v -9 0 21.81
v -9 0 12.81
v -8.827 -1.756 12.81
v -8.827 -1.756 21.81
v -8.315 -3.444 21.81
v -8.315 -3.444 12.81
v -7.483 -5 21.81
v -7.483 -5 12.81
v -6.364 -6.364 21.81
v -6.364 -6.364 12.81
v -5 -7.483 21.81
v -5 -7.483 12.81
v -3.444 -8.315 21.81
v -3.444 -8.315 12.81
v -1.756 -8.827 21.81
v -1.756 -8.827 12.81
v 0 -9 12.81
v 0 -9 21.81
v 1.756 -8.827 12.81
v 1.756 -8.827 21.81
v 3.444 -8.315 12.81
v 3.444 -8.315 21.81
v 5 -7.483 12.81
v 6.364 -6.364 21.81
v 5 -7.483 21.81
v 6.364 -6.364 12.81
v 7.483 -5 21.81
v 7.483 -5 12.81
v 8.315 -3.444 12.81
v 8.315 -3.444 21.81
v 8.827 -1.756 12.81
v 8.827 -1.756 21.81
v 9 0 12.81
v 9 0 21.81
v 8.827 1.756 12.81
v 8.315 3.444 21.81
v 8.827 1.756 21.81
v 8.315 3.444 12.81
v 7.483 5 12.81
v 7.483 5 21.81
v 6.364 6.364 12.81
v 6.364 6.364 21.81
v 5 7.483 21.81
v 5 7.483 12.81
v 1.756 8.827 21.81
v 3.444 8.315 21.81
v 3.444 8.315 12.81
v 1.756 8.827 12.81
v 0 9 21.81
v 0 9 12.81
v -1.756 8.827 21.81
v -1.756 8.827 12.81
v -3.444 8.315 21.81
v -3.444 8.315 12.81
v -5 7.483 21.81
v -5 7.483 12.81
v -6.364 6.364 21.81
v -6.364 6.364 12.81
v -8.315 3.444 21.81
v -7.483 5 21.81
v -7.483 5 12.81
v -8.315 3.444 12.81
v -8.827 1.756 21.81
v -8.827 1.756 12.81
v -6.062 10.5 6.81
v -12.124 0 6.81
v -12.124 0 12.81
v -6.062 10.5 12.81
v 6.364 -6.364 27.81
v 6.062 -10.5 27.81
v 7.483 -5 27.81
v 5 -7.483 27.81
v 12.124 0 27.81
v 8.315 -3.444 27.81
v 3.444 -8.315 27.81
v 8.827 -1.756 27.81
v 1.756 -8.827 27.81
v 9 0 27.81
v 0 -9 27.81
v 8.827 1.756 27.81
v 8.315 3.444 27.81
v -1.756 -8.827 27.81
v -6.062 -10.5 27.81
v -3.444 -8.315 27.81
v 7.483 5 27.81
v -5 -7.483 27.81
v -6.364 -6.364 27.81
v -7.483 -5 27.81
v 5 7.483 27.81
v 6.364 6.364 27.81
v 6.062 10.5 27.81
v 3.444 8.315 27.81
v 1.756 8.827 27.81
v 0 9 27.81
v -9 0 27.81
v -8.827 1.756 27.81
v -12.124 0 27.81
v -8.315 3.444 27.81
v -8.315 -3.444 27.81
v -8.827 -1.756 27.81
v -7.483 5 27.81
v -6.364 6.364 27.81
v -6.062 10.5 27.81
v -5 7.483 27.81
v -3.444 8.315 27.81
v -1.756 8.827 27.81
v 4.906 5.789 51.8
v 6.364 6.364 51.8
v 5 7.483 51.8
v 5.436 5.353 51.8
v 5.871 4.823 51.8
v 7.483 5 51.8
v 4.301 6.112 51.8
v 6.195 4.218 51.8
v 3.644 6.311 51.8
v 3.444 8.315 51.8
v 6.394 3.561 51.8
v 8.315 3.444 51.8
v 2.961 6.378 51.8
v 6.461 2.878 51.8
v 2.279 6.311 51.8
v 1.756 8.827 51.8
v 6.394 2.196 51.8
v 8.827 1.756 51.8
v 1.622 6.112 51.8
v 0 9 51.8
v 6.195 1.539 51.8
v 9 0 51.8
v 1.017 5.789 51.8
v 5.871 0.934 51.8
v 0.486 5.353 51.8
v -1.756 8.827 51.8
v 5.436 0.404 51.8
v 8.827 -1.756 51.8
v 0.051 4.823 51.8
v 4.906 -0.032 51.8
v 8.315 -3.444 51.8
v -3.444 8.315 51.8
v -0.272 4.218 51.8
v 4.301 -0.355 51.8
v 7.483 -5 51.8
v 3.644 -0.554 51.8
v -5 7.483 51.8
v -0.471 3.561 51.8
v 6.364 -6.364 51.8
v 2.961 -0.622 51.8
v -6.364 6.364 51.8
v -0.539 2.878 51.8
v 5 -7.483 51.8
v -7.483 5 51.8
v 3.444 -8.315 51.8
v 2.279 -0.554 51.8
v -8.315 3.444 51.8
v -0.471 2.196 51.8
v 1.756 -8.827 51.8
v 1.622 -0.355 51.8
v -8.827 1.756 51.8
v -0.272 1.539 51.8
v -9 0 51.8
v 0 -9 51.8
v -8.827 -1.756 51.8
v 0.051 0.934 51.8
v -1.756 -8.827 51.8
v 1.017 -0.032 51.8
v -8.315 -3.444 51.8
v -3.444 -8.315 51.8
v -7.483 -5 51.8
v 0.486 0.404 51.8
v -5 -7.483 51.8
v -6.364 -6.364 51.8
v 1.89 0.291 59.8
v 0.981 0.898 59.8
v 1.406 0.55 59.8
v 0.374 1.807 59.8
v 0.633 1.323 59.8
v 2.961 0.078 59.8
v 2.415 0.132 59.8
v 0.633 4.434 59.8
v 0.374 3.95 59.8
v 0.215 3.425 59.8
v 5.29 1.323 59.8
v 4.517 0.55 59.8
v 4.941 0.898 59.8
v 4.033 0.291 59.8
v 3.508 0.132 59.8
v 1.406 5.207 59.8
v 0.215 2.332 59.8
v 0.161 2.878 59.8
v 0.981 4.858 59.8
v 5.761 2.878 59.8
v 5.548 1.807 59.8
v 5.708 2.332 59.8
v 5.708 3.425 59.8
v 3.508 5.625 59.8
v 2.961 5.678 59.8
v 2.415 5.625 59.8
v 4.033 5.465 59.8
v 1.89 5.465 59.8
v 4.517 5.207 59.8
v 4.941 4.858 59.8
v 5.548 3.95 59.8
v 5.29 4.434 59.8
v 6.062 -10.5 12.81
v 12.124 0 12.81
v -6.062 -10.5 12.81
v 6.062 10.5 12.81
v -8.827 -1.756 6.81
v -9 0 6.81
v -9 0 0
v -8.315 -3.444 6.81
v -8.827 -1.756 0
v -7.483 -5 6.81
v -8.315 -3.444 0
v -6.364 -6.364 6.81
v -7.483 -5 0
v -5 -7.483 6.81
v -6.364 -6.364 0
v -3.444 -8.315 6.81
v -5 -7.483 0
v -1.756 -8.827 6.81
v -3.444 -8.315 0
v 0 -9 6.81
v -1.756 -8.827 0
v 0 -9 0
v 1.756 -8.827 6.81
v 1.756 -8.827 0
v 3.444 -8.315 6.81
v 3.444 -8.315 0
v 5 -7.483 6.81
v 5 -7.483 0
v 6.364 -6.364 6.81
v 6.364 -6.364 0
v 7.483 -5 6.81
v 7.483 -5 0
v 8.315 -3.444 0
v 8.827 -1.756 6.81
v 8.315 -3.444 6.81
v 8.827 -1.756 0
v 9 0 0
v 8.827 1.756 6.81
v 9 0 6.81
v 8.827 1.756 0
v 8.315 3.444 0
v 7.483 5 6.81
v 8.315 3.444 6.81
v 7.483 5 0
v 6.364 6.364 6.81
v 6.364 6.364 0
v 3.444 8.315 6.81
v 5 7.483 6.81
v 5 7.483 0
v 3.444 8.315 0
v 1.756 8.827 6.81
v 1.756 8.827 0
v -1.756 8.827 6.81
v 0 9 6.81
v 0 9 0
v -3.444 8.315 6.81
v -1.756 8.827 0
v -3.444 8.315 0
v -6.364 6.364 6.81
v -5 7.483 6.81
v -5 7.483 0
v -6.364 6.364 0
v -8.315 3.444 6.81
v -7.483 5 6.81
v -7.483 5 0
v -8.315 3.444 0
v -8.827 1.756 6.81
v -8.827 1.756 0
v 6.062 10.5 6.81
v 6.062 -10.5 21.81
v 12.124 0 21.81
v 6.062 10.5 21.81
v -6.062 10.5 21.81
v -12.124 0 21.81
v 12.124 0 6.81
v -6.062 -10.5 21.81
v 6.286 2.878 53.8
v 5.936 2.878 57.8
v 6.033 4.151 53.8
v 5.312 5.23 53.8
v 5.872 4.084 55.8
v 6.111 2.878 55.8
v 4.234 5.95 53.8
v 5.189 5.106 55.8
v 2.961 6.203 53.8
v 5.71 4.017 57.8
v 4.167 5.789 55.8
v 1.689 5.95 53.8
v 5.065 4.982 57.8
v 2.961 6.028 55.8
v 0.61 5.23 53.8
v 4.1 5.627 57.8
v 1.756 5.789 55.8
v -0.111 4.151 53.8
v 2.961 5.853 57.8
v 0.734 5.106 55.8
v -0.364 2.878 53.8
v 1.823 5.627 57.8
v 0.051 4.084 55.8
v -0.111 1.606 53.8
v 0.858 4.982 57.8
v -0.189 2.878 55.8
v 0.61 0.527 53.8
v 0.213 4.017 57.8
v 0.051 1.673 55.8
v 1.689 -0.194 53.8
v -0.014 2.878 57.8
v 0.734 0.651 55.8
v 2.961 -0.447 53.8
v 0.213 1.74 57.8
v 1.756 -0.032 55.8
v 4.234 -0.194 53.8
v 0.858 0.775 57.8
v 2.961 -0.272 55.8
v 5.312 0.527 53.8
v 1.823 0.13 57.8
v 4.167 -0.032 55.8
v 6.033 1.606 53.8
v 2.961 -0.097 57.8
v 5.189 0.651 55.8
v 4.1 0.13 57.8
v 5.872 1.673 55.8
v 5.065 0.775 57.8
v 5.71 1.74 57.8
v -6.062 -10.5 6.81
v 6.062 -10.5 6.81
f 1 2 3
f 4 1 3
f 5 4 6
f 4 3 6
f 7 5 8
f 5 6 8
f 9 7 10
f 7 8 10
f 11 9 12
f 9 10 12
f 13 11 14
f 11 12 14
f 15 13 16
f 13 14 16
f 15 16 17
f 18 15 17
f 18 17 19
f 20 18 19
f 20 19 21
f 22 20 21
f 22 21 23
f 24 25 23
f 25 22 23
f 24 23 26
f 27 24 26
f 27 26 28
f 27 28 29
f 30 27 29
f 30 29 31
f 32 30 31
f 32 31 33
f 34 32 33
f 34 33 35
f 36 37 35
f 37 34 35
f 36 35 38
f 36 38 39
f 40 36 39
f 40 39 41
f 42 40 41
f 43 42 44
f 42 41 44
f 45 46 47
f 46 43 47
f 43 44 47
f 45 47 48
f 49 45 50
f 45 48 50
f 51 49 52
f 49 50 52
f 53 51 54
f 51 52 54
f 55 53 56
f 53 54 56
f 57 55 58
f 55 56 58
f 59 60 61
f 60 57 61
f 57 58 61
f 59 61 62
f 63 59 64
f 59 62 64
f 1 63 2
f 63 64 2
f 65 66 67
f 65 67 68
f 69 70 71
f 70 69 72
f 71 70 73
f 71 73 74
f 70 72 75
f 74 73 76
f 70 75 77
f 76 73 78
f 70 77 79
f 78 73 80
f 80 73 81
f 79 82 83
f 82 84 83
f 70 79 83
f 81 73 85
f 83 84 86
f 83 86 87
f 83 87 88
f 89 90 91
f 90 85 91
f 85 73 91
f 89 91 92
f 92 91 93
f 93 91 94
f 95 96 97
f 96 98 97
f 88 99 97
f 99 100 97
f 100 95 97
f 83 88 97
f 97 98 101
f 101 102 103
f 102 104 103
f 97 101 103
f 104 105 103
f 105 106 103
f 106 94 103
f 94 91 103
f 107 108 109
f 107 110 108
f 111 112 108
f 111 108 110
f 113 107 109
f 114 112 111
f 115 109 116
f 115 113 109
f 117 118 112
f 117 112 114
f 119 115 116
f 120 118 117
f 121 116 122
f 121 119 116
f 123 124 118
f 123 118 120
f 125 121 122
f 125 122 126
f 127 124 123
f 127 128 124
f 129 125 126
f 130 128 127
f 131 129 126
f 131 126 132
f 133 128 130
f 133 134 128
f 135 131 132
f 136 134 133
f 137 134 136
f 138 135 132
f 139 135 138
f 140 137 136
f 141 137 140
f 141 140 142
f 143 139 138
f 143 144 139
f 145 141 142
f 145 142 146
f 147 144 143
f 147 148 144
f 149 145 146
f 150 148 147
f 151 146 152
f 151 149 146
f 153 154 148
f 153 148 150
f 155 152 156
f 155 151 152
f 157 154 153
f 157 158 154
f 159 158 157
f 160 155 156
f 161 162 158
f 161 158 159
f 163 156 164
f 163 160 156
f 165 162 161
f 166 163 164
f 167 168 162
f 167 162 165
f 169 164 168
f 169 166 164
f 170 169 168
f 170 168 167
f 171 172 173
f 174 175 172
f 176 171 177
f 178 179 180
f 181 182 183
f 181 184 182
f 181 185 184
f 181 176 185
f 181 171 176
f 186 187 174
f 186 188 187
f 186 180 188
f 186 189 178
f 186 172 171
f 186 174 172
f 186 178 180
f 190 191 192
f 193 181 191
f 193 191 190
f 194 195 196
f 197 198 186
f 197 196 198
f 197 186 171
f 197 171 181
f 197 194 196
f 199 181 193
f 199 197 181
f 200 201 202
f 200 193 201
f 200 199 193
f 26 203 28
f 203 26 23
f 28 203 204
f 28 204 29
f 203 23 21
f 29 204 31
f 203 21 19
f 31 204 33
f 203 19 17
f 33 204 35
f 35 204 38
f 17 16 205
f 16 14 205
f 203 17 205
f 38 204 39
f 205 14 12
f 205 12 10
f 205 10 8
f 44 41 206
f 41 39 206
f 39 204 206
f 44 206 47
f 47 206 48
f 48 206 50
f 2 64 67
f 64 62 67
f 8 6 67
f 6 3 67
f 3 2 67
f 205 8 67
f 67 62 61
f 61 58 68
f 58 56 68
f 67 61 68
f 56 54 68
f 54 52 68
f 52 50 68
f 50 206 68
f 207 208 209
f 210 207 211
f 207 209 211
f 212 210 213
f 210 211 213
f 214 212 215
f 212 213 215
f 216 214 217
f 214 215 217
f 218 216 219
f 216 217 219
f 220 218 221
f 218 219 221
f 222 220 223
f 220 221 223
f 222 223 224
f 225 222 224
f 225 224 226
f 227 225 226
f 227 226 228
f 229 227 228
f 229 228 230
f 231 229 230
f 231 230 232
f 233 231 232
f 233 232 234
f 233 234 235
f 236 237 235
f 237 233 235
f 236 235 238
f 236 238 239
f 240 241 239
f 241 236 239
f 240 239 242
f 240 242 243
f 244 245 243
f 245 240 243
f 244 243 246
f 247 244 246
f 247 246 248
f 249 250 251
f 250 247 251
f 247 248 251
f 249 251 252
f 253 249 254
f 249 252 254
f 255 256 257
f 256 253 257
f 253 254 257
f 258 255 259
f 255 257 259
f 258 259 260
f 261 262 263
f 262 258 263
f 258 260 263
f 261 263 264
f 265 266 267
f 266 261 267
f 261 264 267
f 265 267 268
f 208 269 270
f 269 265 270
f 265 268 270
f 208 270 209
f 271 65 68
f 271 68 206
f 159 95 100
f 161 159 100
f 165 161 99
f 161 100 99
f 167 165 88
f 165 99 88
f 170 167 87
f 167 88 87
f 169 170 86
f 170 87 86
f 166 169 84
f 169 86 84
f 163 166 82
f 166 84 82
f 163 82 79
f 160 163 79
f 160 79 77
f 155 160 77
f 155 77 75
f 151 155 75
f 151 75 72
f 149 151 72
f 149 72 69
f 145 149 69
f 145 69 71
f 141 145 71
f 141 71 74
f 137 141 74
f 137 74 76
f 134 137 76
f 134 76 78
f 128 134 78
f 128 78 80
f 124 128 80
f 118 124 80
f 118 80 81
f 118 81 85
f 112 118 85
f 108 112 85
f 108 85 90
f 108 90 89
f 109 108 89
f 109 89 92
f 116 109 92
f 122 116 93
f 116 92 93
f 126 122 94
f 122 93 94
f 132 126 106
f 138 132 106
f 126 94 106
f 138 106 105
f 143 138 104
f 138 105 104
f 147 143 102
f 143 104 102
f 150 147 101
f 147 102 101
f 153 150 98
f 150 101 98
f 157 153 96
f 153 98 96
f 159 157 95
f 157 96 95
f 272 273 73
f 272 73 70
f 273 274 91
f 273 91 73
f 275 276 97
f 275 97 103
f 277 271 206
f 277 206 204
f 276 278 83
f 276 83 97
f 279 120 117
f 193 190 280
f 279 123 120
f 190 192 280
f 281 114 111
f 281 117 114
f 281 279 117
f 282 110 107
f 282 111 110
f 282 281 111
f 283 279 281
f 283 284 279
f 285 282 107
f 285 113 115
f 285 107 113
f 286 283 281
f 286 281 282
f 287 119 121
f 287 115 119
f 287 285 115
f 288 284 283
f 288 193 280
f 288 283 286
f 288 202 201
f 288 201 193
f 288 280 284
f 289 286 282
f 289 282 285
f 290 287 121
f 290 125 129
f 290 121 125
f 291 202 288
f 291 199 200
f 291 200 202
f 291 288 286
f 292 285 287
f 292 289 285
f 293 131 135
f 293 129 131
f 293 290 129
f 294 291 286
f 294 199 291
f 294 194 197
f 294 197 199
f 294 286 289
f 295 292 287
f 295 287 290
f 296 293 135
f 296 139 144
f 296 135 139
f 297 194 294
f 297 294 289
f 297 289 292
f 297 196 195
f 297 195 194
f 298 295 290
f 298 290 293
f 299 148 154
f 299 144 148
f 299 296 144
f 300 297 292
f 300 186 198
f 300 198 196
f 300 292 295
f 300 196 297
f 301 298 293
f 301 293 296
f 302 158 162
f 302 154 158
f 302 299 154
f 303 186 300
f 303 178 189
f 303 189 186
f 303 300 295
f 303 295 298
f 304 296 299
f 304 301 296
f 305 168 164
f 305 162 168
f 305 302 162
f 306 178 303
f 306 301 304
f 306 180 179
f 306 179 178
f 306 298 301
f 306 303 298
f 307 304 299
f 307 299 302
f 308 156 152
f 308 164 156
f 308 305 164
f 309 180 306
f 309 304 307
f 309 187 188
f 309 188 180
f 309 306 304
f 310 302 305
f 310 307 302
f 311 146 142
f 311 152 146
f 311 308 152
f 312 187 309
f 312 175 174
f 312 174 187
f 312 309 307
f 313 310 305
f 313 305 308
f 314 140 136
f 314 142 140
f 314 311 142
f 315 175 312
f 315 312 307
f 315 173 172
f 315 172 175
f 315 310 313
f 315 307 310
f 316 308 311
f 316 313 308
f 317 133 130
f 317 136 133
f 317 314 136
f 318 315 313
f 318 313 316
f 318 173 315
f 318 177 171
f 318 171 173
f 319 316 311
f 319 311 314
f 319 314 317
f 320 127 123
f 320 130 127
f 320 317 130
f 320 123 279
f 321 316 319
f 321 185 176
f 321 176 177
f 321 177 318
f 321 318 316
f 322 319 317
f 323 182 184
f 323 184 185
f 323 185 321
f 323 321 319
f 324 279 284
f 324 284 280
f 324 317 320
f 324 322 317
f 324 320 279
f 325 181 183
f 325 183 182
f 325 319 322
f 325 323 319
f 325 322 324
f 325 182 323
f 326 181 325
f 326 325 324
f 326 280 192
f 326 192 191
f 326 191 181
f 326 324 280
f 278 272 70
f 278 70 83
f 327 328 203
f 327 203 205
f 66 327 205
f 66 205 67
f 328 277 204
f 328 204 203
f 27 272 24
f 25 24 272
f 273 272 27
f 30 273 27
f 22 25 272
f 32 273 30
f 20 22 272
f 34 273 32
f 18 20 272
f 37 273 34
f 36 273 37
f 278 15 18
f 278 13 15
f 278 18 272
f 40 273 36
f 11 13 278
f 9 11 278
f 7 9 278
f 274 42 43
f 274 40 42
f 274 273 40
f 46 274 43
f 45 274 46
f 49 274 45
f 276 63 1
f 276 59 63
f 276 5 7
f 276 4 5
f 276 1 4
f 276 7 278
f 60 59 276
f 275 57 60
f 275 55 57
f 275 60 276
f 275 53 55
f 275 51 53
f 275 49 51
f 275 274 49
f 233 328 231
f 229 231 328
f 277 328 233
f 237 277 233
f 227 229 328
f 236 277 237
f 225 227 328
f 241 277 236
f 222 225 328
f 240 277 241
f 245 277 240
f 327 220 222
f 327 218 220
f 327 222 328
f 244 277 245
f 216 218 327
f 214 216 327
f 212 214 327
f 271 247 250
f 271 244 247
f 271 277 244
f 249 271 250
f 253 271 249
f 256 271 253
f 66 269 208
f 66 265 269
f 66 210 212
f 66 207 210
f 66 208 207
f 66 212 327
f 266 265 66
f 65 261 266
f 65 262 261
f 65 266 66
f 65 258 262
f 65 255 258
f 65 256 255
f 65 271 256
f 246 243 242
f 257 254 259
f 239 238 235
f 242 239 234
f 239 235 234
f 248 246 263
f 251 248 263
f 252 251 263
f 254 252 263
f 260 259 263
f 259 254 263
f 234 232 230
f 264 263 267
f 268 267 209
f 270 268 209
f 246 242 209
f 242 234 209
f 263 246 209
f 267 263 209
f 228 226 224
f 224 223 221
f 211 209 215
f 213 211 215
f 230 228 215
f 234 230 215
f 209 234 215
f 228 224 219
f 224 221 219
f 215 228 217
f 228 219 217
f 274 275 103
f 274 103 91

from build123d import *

# Parameters (mm, degrees)
IZIM1_R                     = 9
Y_KSEKLIK_EKSTR_ZYON1_DEPTH = 51.8
IZIM2_R                     = 3.5
Y_KSEKLIK_EKSTR_ZYON2_DEPTH = 8
Y_KSEKLIK_EKSTR_ZYON2_TAPER = 5
Y_KSEKLIK_EKSTR_ZYON3_DEPTH = 6
LPATTERN1_COUNT             = 2
LPATTERN1_PITCH             = 15


with BuildPart() as part:
    # Çizim1 → Yükseklik-Ekstrüzyon1 (new body)
    with BuildSketch(Plane.XY):
        with Locations(Location((0, 0, 0), (0, 0, 180))):
            Circle(IZIM1_R)
    extrude(amount=Y_KSEKLIK_EKSTR_ZYON1_DEPTH)

    # Çizim2 → Yükseklik-Ekstrüzyon2 (add)
    with BuildSketch(Plane.XY.offset(51.8)):
        with Locations((2.961323267, 2.878406216)):
            Circle(IZIM2_R)
    extrude(amount=Y_KSEKLIK_EKSTR_ZYON2_DEPTH, taper=Y_KSEKLIK_EKSTR_ZYON2_TAPER)

    # Çizim6 → Yükseklik-Ekstrüzyon3 (add)
    with BuildSketch(Plane(origin=(0, 0, 6.81), x_dir=(-1, 0, 0), z_dir=(0, 0, -1))):
        Polygon((6.062177826, 10.5), (-6.062177826, 10.5), (-12.124355653, 0), (-6.062177826, -10.5), (6.062177826, -10.5), (12.124355653, 0), align=None)
    y_kseklik_ekstr_zyon3 = extrude(amount=-Y_KSEKLIK_EKSTR_ZYON3_DEPTH)

    # LPattern1: Yükseklik-Ekstrüzyon3 ×2
    with Locations(*[(0, 0, i * LPATTERN1_PITCH) for i in range(1, LPATTERN1_COUNT)]):
        add(y_kseklik_ekstr_zyon3)


solid = part.part
